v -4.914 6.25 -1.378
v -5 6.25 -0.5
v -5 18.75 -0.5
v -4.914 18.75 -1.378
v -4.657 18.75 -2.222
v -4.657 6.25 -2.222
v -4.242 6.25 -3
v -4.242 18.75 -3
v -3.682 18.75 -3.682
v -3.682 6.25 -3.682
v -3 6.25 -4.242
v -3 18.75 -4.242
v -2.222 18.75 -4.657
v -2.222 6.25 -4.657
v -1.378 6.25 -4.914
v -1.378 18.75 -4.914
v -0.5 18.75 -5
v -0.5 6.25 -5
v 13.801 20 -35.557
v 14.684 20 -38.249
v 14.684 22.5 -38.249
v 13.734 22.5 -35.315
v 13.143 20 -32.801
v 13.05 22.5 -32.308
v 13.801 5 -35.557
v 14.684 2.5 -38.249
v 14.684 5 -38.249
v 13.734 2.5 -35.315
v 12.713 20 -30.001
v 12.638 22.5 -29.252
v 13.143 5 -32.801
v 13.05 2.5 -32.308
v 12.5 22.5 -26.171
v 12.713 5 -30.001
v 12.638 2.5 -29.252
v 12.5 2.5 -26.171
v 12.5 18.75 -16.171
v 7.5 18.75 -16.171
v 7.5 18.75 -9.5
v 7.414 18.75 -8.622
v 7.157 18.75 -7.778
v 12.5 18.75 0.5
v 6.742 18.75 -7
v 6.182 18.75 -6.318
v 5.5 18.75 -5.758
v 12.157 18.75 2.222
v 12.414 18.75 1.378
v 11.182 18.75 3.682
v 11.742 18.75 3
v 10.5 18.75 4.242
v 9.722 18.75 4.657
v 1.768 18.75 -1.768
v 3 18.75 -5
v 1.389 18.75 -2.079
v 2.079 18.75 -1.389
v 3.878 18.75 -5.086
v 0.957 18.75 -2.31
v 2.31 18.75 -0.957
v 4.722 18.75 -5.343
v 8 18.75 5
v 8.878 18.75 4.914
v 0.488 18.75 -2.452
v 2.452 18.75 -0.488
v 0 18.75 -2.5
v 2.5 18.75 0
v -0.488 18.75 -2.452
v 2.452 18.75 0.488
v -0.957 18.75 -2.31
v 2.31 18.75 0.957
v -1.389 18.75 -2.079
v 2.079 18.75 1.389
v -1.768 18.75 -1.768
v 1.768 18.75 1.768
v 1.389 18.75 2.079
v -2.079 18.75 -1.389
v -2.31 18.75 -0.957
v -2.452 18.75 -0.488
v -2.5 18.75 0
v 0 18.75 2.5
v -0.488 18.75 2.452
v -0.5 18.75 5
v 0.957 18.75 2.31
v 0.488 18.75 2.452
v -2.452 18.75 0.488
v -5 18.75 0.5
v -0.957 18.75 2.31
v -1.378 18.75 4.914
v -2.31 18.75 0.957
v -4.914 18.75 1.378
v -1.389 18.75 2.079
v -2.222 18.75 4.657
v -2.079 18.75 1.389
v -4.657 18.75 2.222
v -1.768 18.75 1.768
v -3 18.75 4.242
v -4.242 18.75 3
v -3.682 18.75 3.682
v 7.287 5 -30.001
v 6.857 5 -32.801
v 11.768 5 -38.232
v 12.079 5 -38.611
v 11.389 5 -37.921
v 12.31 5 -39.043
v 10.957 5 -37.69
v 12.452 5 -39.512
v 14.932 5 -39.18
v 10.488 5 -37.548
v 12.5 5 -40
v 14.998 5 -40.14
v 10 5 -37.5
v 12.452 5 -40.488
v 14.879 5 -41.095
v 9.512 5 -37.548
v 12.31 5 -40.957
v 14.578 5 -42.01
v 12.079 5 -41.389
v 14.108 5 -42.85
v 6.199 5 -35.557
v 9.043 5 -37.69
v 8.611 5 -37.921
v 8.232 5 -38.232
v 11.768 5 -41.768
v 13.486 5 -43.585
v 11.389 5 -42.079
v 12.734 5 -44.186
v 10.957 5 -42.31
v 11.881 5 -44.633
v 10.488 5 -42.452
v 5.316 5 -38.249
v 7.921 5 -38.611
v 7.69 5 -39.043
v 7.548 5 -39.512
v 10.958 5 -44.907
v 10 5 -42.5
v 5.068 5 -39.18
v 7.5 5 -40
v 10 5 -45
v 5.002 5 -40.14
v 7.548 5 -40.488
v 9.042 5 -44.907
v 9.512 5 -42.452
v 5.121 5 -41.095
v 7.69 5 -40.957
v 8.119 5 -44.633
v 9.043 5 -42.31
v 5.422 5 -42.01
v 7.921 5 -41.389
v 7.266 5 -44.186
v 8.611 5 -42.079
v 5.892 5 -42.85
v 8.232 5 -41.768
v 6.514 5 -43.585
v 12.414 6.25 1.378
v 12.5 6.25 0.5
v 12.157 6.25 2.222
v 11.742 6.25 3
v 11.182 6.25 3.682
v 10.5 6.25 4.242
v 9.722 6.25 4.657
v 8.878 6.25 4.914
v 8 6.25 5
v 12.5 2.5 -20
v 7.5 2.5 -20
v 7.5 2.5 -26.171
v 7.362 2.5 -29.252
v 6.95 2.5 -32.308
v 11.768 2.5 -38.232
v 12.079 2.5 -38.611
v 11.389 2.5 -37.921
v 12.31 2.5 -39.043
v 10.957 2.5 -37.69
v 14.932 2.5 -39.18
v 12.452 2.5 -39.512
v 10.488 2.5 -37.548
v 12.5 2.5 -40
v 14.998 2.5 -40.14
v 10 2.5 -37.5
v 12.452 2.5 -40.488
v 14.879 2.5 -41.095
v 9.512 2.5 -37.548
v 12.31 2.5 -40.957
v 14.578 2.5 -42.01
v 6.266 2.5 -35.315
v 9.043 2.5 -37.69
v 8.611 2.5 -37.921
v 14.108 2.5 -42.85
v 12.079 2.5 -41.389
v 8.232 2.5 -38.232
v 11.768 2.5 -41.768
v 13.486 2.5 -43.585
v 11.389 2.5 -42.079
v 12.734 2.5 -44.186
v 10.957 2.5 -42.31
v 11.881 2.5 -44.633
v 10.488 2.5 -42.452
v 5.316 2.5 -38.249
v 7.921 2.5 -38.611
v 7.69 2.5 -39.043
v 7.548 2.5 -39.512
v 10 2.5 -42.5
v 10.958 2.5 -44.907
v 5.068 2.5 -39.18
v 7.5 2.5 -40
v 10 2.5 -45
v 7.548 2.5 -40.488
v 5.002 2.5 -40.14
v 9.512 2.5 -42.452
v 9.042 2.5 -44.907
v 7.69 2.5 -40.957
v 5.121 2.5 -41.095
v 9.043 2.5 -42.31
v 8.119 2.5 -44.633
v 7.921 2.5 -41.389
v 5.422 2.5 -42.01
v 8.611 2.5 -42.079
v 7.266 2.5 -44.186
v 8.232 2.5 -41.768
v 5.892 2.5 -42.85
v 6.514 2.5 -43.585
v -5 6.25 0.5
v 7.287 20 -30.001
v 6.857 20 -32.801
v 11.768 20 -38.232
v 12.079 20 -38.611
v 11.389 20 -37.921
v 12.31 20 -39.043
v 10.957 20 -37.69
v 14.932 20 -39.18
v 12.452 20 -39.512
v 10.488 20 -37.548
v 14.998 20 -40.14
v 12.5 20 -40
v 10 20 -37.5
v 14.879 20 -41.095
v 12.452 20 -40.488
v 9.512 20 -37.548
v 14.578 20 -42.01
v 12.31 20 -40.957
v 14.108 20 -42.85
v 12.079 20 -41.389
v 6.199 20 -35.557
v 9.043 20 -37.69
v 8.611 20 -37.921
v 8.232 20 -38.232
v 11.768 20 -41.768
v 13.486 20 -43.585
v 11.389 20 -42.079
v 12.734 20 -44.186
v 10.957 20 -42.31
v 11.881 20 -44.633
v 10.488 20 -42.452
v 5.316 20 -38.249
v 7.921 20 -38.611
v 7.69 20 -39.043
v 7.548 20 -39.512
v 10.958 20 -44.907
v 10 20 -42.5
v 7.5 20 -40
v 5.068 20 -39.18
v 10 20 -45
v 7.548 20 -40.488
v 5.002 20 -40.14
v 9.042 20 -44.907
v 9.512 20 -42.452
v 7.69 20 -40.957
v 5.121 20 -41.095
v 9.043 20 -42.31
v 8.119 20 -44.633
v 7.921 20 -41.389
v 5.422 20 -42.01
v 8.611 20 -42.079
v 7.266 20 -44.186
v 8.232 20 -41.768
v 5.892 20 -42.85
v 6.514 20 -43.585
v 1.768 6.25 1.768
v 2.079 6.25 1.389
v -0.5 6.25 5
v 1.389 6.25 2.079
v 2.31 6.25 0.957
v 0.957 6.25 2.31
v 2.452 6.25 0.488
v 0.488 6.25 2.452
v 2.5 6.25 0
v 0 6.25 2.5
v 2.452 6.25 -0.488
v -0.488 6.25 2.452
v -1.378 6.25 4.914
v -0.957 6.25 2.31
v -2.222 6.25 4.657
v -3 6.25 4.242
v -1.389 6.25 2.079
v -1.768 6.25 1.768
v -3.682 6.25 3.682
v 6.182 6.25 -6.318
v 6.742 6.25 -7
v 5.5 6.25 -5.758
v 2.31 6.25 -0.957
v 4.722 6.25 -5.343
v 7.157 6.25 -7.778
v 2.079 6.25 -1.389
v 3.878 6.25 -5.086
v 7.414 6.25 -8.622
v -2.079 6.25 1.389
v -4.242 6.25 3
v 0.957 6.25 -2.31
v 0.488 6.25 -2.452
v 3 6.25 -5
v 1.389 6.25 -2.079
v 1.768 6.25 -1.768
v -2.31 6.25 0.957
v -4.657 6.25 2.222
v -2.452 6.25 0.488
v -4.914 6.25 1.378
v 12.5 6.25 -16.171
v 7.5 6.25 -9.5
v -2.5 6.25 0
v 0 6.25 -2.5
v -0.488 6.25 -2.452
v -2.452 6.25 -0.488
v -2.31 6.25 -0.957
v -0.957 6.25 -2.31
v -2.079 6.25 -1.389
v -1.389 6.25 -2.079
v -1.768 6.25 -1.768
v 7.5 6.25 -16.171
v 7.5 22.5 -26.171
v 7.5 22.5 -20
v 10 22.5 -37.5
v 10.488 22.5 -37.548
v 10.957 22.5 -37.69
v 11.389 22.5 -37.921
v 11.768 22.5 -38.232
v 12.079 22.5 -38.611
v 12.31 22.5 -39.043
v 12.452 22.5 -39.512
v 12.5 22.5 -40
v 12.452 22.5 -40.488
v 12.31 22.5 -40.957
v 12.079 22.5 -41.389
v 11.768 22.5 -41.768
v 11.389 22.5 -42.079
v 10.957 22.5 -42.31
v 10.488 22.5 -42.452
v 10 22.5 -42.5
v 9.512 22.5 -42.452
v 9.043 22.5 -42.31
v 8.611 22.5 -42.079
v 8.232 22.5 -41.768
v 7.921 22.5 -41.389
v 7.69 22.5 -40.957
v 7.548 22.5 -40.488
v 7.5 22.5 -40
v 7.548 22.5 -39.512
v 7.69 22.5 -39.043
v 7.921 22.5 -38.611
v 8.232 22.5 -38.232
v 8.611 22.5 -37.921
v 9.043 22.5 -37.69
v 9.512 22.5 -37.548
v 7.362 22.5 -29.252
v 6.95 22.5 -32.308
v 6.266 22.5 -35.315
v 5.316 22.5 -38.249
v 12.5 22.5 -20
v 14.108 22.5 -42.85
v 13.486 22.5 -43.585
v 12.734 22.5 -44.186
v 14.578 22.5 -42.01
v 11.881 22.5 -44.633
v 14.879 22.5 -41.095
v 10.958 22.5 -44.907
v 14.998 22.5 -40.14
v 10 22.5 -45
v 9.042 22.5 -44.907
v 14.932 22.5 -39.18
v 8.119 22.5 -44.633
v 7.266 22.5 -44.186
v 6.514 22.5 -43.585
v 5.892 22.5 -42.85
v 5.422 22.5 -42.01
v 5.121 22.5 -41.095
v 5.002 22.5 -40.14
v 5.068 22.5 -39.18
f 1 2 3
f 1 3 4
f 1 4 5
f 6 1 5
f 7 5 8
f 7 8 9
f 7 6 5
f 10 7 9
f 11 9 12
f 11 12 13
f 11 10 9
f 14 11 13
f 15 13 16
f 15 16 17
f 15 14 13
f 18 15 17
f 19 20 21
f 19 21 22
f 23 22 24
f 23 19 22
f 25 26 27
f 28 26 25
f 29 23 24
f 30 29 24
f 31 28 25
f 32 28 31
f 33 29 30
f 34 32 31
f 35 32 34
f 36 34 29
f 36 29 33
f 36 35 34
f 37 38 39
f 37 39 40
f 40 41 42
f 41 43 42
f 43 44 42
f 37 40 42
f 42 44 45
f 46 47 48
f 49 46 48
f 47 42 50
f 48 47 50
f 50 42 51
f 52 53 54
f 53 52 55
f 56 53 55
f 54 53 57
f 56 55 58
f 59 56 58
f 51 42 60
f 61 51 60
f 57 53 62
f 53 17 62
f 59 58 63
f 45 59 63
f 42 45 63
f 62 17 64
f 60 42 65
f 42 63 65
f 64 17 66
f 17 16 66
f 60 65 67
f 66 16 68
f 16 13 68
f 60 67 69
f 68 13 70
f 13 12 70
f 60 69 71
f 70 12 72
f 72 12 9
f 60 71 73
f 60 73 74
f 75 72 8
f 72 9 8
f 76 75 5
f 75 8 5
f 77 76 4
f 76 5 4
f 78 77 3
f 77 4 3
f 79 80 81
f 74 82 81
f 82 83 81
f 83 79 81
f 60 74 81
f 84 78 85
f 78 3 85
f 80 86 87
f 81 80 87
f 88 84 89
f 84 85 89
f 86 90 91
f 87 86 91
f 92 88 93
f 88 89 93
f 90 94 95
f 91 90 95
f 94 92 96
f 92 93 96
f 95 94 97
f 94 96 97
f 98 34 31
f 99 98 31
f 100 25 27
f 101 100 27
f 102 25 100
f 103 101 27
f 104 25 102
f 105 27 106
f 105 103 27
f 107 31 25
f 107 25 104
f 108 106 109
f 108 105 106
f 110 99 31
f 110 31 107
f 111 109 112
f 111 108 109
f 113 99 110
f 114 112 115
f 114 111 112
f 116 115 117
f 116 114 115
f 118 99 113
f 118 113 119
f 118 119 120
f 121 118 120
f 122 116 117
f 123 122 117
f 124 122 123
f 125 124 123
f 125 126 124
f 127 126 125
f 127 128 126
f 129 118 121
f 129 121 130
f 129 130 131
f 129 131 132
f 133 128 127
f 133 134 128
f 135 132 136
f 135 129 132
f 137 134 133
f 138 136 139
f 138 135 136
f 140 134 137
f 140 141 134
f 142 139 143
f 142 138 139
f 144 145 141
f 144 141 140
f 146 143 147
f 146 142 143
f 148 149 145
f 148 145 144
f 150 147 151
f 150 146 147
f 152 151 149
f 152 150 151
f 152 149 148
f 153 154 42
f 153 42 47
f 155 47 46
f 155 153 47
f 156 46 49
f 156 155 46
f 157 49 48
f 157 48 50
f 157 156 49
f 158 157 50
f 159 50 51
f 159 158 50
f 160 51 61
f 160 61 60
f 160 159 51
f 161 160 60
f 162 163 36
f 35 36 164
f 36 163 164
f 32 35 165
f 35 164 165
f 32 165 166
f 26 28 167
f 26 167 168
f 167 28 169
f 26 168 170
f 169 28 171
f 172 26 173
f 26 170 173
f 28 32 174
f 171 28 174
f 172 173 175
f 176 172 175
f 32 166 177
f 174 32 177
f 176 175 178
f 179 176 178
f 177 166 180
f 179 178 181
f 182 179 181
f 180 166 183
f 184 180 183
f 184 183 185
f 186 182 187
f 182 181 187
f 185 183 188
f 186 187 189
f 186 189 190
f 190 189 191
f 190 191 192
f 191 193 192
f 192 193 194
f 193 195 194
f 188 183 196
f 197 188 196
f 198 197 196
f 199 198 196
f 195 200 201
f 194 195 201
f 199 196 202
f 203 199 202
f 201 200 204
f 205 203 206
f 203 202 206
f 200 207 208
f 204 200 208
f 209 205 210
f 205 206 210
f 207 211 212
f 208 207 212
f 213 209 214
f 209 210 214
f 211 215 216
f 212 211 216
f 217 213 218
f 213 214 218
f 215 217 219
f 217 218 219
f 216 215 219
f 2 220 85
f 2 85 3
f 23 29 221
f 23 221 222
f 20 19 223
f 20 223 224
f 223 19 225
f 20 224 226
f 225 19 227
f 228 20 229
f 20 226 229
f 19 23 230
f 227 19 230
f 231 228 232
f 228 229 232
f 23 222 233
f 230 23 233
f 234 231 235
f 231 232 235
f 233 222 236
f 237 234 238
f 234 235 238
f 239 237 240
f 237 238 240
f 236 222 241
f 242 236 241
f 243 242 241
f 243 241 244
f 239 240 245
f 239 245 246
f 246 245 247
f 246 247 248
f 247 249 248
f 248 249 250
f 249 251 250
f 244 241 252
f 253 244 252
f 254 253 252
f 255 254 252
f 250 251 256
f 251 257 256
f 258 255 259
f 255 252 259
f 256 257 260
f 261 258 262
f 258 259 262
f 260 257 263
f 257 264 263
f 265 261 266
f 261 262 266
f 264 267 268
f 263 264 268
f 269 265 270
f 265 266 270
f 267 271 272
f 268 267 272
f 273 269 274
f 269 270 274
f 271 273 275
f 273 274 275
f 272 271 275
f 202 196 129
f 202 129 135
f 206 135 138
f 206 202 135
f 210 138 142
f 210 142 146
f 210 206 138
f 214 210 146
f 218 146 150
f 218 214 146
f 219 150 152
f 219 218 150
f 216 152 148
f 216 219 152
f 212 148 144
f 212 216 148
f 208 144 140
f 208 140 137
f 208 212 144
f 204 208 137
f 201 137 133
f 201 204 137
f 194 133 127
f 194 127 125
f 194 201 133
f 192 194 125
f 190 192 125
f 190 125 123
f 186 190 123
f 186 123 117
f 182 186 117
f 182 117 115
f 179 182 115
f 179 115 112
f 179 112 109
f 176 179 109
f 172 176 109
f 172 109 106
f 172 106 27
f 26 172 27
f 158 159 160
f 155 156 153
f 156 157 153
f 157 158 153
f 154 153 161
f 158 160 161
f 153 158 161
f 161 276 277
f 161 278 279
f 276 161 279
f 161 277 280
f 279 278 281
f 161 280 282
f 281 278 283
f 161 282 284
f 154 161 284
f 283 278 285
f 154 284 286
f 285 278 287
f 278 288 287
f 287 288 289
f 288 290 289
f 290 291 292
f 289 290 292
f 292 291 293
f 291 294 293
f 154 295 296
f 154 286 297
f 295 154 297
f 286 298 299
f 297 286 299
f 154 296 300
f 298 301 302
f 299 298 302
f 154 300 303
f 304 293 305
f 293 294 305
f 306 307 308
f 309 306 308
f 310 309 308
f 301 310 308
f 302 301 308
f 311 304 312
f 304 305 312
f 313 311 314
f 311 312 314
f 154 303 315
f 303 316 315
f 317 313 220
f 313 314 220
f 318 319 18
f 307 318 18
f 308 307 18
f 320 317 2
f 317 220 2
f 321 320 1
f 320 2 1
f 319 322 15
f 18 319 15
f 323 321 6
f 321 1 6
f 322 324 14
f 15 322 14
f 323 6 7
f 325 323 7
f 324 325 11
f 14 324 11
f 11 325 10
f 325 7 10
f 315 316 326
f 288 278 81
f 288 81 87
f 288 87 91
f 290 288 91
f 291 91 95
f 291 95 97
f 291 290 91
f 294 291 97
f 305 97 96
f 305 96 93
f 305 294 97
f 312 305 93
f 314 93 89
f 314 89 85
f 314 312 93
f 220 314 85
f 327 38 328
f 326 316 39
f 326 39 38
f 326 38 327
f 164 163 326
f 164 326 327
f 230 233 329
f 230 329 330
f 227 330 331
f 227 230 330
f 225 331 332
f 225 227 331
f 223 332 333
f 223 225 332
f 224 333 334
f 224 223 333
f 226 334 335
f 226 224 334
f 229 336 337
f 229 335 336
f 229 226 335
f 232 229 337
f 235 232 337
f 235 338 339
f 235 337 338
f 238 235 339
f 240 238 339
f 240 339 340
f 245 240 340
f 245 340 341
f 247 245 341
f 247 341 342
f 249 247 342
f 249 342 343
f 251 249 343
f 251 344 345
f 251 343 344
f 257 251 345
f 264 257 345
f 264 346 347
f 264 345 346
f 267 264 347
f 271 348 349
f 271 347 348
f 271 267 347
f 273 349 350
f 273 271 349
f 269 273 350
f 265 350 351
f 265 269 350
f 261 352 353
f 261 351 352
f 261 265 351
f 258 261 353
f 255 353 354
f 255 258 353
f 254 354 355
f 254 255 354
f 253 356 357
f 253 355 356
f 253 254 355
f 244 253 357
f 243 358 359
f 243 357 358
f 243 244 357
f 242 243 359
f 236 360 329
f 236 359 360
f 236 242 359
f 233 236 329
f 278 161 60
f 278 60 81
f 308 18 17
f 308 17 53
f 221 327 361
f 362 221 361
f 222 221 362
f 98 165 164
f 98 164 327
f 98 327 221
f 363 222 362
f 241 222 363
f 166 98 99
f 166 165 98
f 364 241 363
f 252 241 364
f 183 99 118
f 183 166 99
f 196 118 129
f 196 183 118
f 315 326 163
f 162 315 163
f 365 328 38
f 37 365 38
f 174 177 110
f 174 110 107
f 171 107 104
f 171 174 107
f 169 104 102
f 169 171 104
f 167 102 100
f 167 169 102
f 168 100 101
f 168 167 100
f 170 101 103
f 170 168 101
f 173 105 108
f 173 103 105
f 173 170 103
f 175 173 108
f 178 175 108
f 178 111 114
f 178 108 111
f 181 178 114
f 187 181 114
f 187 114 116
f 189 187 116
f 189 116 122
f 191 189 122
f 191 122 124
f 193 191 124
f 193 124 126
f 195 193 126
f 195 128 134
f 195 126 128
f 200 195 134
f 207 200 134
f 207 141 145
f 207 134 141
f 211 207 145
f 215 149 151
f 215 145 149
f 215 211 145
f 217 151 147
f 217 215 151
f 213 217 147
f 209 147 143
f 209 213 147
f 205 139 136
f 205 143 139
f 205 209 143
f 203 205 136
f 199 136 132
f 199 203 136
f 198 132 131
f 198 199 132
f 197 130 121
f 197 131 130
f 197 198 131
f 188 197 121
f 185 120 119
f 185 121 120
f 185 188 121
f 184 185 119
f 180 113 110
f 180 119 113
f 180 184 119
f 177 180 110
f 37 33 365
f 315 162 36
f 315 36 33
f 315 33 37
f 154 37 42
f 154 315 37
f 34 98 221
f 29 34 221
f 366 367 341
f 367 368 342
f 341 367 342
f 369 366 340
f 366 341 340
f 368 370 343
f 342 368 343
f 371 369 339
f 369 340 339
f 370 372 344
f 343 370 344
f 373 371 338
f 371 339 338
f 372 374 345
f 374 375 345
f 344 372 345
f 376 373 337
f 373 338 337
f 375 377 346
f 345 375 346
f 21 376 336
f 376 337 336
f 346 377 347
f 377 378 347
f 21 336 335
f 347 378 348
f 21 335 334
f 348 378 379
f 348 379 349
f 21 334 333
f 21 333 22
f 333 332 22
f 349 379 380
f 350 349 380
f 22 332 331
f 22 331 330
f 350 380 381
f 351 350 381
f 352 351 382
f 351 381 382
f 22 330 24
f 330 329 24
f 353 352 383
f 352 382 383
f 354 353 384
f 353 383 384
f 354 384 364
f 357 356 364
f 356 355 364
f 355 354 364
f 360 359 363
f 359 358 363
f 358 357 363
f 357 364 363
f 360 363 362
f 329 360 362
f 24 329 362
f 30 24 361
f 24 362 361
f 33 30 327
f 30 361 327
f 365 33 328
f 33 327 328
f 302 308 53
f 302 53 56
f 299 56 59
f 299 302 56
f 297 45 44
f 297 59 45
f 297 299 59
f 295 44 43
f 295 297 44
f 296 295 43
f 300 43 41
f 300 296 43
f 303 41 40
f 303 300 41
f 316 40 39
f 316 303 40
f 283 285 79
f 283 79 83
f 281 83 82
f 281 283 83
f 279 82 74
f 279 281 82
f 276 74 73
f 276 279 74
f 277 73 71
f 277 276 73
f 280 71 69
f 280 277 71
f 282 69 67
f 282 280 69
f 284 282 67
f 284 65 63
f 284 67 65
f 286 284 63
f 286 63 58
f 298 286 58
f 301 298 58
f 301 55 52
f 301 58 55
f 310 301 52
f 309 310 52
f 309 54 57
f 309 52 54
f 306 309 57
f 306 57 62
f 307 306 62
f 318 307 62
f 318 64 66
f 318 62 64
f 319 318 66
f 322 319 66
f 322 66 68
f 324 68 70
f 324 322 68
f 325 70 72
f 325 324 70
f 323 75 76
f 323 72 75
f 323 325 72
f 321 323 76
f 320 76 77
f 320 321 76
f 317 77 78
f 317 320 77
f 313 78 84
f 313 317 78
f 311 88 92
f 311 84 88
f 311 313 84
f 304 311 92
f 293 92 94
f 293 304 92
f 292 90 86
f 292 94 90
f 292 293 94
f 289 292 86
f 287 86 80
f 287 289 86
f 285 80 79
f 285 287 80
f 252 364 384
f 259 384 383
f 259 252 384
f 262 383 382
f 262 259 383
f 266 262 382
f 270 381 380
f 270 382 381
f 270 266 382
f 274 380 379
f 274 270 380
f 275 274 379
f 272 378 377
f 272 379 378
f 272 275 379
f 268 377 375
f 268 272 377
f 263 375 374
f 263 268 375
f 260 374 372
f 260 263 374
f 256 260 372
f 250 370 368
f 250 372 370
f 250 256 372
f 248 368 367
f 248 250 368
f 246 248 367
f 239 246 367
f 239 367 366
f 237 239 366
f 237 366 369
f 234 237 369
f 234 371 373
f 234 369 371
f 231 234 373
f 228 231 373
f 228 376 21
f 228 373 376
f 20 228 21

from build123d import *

# Parameters (mm, degrees)
SKETCH1_R               = 2.5
BOSS_EXTRUDE1_DEPTH     = 25
CUT_EXTRUDE2_DEPTH      = 54.619026474
CUT_EXTRUDE2_DEPTH_BACK = 54.619026474
SKETCH4_W               = 15
SKETCH4_H               = 15


with BuildPart() as part:
    # Sketch1 → Boss-Extrude1 (new body)
    with BuildSketch(Plane(origin=(0, 0, 0), x_dir=(1, 0, 0), z_dir=(0, 1, 0))):
        with BuildLine():
            Line((7.5, 9.5), (7.5, 26.170683314))
            ThreePointArc((7.5, 26.170683314), (6.949725489, 32.307957892), (5.316455696, 38.249453584))
            ThreePointArc((5.316455696, 38.249453584), (10, 45), (14.683544304, 38.249453584))
            ThreePointArc((14.683544304, 38.249453584), (13.050274511, 32.307957892), (12.5, 26.170683314))
            Line((12.5, 26.170683314), (12.5, 15))
            Line((12.5, 15), (12.5, -0.5))
            ThreePointArc((12.5, -0.5), (11.181980515, -3.681980515), (8, -5))
            Line((8, -5), (-0.5, -5))
            ThreePointArc((-0.5, -5), (-3.681980515, -3.681980515), (-5, -0.5))
            Line((-5, -0.5), (-5, 0.5))
            ThreePointArc((-5, 0.5), (-3.681980515, 3.681980515), (-0.5, 5))
            Line((-0.5, 5), (3, 5))
            ThreePointArc((3, 5), (6.181980515, 6.318019485), (7.5, 9.5))
        make_face()
        with Locations(Location((0, 0, 0), (0, 0, 270))):
            Circle(SKETCH1_R, mode=Mode.SUBTRACT)
        with Locations(Location((10, 40, 0), (0, 0, 270))):
            Circle(SKETCH1_R, mode=Mode.SUBTRACT)
    extrude(amount=BOSS_EXTRUDE1_DEPTH)

    # Sketch4 → Cut-Extrude2 (cut, two sides: drawn at the far end of the back side and taken through both)
    with BuildSketch(Plane(origin=(0, 0, 0), x_dir=(0, 0, -1), z_dir=(1, 0, 0)).offset(-CUT_EXTRUDE2_DEPTH_BACK)):
        with Locations((37.501037615, 12.5)):
            Rectangle(SKETCH4_W, SKETCH4_H)
        Polygon((45, 25), (45, 22.5), (20, 22.5), (16.170683314, 18.75), (-5, 18.75), (-5, 25), align=None)
        Polygon((45, 0), (-5, 0), (-5, 6.25), (16.170683314, 6.25), (20, 2.5), (45, 2.5), align=None)
    extrude(amount=CUT_EXTRUDE2_DEPTH + CUT_EXTRUDE2_DEPTH_BACK, mode=Mode.SUBTRACT)


solid = part.part
